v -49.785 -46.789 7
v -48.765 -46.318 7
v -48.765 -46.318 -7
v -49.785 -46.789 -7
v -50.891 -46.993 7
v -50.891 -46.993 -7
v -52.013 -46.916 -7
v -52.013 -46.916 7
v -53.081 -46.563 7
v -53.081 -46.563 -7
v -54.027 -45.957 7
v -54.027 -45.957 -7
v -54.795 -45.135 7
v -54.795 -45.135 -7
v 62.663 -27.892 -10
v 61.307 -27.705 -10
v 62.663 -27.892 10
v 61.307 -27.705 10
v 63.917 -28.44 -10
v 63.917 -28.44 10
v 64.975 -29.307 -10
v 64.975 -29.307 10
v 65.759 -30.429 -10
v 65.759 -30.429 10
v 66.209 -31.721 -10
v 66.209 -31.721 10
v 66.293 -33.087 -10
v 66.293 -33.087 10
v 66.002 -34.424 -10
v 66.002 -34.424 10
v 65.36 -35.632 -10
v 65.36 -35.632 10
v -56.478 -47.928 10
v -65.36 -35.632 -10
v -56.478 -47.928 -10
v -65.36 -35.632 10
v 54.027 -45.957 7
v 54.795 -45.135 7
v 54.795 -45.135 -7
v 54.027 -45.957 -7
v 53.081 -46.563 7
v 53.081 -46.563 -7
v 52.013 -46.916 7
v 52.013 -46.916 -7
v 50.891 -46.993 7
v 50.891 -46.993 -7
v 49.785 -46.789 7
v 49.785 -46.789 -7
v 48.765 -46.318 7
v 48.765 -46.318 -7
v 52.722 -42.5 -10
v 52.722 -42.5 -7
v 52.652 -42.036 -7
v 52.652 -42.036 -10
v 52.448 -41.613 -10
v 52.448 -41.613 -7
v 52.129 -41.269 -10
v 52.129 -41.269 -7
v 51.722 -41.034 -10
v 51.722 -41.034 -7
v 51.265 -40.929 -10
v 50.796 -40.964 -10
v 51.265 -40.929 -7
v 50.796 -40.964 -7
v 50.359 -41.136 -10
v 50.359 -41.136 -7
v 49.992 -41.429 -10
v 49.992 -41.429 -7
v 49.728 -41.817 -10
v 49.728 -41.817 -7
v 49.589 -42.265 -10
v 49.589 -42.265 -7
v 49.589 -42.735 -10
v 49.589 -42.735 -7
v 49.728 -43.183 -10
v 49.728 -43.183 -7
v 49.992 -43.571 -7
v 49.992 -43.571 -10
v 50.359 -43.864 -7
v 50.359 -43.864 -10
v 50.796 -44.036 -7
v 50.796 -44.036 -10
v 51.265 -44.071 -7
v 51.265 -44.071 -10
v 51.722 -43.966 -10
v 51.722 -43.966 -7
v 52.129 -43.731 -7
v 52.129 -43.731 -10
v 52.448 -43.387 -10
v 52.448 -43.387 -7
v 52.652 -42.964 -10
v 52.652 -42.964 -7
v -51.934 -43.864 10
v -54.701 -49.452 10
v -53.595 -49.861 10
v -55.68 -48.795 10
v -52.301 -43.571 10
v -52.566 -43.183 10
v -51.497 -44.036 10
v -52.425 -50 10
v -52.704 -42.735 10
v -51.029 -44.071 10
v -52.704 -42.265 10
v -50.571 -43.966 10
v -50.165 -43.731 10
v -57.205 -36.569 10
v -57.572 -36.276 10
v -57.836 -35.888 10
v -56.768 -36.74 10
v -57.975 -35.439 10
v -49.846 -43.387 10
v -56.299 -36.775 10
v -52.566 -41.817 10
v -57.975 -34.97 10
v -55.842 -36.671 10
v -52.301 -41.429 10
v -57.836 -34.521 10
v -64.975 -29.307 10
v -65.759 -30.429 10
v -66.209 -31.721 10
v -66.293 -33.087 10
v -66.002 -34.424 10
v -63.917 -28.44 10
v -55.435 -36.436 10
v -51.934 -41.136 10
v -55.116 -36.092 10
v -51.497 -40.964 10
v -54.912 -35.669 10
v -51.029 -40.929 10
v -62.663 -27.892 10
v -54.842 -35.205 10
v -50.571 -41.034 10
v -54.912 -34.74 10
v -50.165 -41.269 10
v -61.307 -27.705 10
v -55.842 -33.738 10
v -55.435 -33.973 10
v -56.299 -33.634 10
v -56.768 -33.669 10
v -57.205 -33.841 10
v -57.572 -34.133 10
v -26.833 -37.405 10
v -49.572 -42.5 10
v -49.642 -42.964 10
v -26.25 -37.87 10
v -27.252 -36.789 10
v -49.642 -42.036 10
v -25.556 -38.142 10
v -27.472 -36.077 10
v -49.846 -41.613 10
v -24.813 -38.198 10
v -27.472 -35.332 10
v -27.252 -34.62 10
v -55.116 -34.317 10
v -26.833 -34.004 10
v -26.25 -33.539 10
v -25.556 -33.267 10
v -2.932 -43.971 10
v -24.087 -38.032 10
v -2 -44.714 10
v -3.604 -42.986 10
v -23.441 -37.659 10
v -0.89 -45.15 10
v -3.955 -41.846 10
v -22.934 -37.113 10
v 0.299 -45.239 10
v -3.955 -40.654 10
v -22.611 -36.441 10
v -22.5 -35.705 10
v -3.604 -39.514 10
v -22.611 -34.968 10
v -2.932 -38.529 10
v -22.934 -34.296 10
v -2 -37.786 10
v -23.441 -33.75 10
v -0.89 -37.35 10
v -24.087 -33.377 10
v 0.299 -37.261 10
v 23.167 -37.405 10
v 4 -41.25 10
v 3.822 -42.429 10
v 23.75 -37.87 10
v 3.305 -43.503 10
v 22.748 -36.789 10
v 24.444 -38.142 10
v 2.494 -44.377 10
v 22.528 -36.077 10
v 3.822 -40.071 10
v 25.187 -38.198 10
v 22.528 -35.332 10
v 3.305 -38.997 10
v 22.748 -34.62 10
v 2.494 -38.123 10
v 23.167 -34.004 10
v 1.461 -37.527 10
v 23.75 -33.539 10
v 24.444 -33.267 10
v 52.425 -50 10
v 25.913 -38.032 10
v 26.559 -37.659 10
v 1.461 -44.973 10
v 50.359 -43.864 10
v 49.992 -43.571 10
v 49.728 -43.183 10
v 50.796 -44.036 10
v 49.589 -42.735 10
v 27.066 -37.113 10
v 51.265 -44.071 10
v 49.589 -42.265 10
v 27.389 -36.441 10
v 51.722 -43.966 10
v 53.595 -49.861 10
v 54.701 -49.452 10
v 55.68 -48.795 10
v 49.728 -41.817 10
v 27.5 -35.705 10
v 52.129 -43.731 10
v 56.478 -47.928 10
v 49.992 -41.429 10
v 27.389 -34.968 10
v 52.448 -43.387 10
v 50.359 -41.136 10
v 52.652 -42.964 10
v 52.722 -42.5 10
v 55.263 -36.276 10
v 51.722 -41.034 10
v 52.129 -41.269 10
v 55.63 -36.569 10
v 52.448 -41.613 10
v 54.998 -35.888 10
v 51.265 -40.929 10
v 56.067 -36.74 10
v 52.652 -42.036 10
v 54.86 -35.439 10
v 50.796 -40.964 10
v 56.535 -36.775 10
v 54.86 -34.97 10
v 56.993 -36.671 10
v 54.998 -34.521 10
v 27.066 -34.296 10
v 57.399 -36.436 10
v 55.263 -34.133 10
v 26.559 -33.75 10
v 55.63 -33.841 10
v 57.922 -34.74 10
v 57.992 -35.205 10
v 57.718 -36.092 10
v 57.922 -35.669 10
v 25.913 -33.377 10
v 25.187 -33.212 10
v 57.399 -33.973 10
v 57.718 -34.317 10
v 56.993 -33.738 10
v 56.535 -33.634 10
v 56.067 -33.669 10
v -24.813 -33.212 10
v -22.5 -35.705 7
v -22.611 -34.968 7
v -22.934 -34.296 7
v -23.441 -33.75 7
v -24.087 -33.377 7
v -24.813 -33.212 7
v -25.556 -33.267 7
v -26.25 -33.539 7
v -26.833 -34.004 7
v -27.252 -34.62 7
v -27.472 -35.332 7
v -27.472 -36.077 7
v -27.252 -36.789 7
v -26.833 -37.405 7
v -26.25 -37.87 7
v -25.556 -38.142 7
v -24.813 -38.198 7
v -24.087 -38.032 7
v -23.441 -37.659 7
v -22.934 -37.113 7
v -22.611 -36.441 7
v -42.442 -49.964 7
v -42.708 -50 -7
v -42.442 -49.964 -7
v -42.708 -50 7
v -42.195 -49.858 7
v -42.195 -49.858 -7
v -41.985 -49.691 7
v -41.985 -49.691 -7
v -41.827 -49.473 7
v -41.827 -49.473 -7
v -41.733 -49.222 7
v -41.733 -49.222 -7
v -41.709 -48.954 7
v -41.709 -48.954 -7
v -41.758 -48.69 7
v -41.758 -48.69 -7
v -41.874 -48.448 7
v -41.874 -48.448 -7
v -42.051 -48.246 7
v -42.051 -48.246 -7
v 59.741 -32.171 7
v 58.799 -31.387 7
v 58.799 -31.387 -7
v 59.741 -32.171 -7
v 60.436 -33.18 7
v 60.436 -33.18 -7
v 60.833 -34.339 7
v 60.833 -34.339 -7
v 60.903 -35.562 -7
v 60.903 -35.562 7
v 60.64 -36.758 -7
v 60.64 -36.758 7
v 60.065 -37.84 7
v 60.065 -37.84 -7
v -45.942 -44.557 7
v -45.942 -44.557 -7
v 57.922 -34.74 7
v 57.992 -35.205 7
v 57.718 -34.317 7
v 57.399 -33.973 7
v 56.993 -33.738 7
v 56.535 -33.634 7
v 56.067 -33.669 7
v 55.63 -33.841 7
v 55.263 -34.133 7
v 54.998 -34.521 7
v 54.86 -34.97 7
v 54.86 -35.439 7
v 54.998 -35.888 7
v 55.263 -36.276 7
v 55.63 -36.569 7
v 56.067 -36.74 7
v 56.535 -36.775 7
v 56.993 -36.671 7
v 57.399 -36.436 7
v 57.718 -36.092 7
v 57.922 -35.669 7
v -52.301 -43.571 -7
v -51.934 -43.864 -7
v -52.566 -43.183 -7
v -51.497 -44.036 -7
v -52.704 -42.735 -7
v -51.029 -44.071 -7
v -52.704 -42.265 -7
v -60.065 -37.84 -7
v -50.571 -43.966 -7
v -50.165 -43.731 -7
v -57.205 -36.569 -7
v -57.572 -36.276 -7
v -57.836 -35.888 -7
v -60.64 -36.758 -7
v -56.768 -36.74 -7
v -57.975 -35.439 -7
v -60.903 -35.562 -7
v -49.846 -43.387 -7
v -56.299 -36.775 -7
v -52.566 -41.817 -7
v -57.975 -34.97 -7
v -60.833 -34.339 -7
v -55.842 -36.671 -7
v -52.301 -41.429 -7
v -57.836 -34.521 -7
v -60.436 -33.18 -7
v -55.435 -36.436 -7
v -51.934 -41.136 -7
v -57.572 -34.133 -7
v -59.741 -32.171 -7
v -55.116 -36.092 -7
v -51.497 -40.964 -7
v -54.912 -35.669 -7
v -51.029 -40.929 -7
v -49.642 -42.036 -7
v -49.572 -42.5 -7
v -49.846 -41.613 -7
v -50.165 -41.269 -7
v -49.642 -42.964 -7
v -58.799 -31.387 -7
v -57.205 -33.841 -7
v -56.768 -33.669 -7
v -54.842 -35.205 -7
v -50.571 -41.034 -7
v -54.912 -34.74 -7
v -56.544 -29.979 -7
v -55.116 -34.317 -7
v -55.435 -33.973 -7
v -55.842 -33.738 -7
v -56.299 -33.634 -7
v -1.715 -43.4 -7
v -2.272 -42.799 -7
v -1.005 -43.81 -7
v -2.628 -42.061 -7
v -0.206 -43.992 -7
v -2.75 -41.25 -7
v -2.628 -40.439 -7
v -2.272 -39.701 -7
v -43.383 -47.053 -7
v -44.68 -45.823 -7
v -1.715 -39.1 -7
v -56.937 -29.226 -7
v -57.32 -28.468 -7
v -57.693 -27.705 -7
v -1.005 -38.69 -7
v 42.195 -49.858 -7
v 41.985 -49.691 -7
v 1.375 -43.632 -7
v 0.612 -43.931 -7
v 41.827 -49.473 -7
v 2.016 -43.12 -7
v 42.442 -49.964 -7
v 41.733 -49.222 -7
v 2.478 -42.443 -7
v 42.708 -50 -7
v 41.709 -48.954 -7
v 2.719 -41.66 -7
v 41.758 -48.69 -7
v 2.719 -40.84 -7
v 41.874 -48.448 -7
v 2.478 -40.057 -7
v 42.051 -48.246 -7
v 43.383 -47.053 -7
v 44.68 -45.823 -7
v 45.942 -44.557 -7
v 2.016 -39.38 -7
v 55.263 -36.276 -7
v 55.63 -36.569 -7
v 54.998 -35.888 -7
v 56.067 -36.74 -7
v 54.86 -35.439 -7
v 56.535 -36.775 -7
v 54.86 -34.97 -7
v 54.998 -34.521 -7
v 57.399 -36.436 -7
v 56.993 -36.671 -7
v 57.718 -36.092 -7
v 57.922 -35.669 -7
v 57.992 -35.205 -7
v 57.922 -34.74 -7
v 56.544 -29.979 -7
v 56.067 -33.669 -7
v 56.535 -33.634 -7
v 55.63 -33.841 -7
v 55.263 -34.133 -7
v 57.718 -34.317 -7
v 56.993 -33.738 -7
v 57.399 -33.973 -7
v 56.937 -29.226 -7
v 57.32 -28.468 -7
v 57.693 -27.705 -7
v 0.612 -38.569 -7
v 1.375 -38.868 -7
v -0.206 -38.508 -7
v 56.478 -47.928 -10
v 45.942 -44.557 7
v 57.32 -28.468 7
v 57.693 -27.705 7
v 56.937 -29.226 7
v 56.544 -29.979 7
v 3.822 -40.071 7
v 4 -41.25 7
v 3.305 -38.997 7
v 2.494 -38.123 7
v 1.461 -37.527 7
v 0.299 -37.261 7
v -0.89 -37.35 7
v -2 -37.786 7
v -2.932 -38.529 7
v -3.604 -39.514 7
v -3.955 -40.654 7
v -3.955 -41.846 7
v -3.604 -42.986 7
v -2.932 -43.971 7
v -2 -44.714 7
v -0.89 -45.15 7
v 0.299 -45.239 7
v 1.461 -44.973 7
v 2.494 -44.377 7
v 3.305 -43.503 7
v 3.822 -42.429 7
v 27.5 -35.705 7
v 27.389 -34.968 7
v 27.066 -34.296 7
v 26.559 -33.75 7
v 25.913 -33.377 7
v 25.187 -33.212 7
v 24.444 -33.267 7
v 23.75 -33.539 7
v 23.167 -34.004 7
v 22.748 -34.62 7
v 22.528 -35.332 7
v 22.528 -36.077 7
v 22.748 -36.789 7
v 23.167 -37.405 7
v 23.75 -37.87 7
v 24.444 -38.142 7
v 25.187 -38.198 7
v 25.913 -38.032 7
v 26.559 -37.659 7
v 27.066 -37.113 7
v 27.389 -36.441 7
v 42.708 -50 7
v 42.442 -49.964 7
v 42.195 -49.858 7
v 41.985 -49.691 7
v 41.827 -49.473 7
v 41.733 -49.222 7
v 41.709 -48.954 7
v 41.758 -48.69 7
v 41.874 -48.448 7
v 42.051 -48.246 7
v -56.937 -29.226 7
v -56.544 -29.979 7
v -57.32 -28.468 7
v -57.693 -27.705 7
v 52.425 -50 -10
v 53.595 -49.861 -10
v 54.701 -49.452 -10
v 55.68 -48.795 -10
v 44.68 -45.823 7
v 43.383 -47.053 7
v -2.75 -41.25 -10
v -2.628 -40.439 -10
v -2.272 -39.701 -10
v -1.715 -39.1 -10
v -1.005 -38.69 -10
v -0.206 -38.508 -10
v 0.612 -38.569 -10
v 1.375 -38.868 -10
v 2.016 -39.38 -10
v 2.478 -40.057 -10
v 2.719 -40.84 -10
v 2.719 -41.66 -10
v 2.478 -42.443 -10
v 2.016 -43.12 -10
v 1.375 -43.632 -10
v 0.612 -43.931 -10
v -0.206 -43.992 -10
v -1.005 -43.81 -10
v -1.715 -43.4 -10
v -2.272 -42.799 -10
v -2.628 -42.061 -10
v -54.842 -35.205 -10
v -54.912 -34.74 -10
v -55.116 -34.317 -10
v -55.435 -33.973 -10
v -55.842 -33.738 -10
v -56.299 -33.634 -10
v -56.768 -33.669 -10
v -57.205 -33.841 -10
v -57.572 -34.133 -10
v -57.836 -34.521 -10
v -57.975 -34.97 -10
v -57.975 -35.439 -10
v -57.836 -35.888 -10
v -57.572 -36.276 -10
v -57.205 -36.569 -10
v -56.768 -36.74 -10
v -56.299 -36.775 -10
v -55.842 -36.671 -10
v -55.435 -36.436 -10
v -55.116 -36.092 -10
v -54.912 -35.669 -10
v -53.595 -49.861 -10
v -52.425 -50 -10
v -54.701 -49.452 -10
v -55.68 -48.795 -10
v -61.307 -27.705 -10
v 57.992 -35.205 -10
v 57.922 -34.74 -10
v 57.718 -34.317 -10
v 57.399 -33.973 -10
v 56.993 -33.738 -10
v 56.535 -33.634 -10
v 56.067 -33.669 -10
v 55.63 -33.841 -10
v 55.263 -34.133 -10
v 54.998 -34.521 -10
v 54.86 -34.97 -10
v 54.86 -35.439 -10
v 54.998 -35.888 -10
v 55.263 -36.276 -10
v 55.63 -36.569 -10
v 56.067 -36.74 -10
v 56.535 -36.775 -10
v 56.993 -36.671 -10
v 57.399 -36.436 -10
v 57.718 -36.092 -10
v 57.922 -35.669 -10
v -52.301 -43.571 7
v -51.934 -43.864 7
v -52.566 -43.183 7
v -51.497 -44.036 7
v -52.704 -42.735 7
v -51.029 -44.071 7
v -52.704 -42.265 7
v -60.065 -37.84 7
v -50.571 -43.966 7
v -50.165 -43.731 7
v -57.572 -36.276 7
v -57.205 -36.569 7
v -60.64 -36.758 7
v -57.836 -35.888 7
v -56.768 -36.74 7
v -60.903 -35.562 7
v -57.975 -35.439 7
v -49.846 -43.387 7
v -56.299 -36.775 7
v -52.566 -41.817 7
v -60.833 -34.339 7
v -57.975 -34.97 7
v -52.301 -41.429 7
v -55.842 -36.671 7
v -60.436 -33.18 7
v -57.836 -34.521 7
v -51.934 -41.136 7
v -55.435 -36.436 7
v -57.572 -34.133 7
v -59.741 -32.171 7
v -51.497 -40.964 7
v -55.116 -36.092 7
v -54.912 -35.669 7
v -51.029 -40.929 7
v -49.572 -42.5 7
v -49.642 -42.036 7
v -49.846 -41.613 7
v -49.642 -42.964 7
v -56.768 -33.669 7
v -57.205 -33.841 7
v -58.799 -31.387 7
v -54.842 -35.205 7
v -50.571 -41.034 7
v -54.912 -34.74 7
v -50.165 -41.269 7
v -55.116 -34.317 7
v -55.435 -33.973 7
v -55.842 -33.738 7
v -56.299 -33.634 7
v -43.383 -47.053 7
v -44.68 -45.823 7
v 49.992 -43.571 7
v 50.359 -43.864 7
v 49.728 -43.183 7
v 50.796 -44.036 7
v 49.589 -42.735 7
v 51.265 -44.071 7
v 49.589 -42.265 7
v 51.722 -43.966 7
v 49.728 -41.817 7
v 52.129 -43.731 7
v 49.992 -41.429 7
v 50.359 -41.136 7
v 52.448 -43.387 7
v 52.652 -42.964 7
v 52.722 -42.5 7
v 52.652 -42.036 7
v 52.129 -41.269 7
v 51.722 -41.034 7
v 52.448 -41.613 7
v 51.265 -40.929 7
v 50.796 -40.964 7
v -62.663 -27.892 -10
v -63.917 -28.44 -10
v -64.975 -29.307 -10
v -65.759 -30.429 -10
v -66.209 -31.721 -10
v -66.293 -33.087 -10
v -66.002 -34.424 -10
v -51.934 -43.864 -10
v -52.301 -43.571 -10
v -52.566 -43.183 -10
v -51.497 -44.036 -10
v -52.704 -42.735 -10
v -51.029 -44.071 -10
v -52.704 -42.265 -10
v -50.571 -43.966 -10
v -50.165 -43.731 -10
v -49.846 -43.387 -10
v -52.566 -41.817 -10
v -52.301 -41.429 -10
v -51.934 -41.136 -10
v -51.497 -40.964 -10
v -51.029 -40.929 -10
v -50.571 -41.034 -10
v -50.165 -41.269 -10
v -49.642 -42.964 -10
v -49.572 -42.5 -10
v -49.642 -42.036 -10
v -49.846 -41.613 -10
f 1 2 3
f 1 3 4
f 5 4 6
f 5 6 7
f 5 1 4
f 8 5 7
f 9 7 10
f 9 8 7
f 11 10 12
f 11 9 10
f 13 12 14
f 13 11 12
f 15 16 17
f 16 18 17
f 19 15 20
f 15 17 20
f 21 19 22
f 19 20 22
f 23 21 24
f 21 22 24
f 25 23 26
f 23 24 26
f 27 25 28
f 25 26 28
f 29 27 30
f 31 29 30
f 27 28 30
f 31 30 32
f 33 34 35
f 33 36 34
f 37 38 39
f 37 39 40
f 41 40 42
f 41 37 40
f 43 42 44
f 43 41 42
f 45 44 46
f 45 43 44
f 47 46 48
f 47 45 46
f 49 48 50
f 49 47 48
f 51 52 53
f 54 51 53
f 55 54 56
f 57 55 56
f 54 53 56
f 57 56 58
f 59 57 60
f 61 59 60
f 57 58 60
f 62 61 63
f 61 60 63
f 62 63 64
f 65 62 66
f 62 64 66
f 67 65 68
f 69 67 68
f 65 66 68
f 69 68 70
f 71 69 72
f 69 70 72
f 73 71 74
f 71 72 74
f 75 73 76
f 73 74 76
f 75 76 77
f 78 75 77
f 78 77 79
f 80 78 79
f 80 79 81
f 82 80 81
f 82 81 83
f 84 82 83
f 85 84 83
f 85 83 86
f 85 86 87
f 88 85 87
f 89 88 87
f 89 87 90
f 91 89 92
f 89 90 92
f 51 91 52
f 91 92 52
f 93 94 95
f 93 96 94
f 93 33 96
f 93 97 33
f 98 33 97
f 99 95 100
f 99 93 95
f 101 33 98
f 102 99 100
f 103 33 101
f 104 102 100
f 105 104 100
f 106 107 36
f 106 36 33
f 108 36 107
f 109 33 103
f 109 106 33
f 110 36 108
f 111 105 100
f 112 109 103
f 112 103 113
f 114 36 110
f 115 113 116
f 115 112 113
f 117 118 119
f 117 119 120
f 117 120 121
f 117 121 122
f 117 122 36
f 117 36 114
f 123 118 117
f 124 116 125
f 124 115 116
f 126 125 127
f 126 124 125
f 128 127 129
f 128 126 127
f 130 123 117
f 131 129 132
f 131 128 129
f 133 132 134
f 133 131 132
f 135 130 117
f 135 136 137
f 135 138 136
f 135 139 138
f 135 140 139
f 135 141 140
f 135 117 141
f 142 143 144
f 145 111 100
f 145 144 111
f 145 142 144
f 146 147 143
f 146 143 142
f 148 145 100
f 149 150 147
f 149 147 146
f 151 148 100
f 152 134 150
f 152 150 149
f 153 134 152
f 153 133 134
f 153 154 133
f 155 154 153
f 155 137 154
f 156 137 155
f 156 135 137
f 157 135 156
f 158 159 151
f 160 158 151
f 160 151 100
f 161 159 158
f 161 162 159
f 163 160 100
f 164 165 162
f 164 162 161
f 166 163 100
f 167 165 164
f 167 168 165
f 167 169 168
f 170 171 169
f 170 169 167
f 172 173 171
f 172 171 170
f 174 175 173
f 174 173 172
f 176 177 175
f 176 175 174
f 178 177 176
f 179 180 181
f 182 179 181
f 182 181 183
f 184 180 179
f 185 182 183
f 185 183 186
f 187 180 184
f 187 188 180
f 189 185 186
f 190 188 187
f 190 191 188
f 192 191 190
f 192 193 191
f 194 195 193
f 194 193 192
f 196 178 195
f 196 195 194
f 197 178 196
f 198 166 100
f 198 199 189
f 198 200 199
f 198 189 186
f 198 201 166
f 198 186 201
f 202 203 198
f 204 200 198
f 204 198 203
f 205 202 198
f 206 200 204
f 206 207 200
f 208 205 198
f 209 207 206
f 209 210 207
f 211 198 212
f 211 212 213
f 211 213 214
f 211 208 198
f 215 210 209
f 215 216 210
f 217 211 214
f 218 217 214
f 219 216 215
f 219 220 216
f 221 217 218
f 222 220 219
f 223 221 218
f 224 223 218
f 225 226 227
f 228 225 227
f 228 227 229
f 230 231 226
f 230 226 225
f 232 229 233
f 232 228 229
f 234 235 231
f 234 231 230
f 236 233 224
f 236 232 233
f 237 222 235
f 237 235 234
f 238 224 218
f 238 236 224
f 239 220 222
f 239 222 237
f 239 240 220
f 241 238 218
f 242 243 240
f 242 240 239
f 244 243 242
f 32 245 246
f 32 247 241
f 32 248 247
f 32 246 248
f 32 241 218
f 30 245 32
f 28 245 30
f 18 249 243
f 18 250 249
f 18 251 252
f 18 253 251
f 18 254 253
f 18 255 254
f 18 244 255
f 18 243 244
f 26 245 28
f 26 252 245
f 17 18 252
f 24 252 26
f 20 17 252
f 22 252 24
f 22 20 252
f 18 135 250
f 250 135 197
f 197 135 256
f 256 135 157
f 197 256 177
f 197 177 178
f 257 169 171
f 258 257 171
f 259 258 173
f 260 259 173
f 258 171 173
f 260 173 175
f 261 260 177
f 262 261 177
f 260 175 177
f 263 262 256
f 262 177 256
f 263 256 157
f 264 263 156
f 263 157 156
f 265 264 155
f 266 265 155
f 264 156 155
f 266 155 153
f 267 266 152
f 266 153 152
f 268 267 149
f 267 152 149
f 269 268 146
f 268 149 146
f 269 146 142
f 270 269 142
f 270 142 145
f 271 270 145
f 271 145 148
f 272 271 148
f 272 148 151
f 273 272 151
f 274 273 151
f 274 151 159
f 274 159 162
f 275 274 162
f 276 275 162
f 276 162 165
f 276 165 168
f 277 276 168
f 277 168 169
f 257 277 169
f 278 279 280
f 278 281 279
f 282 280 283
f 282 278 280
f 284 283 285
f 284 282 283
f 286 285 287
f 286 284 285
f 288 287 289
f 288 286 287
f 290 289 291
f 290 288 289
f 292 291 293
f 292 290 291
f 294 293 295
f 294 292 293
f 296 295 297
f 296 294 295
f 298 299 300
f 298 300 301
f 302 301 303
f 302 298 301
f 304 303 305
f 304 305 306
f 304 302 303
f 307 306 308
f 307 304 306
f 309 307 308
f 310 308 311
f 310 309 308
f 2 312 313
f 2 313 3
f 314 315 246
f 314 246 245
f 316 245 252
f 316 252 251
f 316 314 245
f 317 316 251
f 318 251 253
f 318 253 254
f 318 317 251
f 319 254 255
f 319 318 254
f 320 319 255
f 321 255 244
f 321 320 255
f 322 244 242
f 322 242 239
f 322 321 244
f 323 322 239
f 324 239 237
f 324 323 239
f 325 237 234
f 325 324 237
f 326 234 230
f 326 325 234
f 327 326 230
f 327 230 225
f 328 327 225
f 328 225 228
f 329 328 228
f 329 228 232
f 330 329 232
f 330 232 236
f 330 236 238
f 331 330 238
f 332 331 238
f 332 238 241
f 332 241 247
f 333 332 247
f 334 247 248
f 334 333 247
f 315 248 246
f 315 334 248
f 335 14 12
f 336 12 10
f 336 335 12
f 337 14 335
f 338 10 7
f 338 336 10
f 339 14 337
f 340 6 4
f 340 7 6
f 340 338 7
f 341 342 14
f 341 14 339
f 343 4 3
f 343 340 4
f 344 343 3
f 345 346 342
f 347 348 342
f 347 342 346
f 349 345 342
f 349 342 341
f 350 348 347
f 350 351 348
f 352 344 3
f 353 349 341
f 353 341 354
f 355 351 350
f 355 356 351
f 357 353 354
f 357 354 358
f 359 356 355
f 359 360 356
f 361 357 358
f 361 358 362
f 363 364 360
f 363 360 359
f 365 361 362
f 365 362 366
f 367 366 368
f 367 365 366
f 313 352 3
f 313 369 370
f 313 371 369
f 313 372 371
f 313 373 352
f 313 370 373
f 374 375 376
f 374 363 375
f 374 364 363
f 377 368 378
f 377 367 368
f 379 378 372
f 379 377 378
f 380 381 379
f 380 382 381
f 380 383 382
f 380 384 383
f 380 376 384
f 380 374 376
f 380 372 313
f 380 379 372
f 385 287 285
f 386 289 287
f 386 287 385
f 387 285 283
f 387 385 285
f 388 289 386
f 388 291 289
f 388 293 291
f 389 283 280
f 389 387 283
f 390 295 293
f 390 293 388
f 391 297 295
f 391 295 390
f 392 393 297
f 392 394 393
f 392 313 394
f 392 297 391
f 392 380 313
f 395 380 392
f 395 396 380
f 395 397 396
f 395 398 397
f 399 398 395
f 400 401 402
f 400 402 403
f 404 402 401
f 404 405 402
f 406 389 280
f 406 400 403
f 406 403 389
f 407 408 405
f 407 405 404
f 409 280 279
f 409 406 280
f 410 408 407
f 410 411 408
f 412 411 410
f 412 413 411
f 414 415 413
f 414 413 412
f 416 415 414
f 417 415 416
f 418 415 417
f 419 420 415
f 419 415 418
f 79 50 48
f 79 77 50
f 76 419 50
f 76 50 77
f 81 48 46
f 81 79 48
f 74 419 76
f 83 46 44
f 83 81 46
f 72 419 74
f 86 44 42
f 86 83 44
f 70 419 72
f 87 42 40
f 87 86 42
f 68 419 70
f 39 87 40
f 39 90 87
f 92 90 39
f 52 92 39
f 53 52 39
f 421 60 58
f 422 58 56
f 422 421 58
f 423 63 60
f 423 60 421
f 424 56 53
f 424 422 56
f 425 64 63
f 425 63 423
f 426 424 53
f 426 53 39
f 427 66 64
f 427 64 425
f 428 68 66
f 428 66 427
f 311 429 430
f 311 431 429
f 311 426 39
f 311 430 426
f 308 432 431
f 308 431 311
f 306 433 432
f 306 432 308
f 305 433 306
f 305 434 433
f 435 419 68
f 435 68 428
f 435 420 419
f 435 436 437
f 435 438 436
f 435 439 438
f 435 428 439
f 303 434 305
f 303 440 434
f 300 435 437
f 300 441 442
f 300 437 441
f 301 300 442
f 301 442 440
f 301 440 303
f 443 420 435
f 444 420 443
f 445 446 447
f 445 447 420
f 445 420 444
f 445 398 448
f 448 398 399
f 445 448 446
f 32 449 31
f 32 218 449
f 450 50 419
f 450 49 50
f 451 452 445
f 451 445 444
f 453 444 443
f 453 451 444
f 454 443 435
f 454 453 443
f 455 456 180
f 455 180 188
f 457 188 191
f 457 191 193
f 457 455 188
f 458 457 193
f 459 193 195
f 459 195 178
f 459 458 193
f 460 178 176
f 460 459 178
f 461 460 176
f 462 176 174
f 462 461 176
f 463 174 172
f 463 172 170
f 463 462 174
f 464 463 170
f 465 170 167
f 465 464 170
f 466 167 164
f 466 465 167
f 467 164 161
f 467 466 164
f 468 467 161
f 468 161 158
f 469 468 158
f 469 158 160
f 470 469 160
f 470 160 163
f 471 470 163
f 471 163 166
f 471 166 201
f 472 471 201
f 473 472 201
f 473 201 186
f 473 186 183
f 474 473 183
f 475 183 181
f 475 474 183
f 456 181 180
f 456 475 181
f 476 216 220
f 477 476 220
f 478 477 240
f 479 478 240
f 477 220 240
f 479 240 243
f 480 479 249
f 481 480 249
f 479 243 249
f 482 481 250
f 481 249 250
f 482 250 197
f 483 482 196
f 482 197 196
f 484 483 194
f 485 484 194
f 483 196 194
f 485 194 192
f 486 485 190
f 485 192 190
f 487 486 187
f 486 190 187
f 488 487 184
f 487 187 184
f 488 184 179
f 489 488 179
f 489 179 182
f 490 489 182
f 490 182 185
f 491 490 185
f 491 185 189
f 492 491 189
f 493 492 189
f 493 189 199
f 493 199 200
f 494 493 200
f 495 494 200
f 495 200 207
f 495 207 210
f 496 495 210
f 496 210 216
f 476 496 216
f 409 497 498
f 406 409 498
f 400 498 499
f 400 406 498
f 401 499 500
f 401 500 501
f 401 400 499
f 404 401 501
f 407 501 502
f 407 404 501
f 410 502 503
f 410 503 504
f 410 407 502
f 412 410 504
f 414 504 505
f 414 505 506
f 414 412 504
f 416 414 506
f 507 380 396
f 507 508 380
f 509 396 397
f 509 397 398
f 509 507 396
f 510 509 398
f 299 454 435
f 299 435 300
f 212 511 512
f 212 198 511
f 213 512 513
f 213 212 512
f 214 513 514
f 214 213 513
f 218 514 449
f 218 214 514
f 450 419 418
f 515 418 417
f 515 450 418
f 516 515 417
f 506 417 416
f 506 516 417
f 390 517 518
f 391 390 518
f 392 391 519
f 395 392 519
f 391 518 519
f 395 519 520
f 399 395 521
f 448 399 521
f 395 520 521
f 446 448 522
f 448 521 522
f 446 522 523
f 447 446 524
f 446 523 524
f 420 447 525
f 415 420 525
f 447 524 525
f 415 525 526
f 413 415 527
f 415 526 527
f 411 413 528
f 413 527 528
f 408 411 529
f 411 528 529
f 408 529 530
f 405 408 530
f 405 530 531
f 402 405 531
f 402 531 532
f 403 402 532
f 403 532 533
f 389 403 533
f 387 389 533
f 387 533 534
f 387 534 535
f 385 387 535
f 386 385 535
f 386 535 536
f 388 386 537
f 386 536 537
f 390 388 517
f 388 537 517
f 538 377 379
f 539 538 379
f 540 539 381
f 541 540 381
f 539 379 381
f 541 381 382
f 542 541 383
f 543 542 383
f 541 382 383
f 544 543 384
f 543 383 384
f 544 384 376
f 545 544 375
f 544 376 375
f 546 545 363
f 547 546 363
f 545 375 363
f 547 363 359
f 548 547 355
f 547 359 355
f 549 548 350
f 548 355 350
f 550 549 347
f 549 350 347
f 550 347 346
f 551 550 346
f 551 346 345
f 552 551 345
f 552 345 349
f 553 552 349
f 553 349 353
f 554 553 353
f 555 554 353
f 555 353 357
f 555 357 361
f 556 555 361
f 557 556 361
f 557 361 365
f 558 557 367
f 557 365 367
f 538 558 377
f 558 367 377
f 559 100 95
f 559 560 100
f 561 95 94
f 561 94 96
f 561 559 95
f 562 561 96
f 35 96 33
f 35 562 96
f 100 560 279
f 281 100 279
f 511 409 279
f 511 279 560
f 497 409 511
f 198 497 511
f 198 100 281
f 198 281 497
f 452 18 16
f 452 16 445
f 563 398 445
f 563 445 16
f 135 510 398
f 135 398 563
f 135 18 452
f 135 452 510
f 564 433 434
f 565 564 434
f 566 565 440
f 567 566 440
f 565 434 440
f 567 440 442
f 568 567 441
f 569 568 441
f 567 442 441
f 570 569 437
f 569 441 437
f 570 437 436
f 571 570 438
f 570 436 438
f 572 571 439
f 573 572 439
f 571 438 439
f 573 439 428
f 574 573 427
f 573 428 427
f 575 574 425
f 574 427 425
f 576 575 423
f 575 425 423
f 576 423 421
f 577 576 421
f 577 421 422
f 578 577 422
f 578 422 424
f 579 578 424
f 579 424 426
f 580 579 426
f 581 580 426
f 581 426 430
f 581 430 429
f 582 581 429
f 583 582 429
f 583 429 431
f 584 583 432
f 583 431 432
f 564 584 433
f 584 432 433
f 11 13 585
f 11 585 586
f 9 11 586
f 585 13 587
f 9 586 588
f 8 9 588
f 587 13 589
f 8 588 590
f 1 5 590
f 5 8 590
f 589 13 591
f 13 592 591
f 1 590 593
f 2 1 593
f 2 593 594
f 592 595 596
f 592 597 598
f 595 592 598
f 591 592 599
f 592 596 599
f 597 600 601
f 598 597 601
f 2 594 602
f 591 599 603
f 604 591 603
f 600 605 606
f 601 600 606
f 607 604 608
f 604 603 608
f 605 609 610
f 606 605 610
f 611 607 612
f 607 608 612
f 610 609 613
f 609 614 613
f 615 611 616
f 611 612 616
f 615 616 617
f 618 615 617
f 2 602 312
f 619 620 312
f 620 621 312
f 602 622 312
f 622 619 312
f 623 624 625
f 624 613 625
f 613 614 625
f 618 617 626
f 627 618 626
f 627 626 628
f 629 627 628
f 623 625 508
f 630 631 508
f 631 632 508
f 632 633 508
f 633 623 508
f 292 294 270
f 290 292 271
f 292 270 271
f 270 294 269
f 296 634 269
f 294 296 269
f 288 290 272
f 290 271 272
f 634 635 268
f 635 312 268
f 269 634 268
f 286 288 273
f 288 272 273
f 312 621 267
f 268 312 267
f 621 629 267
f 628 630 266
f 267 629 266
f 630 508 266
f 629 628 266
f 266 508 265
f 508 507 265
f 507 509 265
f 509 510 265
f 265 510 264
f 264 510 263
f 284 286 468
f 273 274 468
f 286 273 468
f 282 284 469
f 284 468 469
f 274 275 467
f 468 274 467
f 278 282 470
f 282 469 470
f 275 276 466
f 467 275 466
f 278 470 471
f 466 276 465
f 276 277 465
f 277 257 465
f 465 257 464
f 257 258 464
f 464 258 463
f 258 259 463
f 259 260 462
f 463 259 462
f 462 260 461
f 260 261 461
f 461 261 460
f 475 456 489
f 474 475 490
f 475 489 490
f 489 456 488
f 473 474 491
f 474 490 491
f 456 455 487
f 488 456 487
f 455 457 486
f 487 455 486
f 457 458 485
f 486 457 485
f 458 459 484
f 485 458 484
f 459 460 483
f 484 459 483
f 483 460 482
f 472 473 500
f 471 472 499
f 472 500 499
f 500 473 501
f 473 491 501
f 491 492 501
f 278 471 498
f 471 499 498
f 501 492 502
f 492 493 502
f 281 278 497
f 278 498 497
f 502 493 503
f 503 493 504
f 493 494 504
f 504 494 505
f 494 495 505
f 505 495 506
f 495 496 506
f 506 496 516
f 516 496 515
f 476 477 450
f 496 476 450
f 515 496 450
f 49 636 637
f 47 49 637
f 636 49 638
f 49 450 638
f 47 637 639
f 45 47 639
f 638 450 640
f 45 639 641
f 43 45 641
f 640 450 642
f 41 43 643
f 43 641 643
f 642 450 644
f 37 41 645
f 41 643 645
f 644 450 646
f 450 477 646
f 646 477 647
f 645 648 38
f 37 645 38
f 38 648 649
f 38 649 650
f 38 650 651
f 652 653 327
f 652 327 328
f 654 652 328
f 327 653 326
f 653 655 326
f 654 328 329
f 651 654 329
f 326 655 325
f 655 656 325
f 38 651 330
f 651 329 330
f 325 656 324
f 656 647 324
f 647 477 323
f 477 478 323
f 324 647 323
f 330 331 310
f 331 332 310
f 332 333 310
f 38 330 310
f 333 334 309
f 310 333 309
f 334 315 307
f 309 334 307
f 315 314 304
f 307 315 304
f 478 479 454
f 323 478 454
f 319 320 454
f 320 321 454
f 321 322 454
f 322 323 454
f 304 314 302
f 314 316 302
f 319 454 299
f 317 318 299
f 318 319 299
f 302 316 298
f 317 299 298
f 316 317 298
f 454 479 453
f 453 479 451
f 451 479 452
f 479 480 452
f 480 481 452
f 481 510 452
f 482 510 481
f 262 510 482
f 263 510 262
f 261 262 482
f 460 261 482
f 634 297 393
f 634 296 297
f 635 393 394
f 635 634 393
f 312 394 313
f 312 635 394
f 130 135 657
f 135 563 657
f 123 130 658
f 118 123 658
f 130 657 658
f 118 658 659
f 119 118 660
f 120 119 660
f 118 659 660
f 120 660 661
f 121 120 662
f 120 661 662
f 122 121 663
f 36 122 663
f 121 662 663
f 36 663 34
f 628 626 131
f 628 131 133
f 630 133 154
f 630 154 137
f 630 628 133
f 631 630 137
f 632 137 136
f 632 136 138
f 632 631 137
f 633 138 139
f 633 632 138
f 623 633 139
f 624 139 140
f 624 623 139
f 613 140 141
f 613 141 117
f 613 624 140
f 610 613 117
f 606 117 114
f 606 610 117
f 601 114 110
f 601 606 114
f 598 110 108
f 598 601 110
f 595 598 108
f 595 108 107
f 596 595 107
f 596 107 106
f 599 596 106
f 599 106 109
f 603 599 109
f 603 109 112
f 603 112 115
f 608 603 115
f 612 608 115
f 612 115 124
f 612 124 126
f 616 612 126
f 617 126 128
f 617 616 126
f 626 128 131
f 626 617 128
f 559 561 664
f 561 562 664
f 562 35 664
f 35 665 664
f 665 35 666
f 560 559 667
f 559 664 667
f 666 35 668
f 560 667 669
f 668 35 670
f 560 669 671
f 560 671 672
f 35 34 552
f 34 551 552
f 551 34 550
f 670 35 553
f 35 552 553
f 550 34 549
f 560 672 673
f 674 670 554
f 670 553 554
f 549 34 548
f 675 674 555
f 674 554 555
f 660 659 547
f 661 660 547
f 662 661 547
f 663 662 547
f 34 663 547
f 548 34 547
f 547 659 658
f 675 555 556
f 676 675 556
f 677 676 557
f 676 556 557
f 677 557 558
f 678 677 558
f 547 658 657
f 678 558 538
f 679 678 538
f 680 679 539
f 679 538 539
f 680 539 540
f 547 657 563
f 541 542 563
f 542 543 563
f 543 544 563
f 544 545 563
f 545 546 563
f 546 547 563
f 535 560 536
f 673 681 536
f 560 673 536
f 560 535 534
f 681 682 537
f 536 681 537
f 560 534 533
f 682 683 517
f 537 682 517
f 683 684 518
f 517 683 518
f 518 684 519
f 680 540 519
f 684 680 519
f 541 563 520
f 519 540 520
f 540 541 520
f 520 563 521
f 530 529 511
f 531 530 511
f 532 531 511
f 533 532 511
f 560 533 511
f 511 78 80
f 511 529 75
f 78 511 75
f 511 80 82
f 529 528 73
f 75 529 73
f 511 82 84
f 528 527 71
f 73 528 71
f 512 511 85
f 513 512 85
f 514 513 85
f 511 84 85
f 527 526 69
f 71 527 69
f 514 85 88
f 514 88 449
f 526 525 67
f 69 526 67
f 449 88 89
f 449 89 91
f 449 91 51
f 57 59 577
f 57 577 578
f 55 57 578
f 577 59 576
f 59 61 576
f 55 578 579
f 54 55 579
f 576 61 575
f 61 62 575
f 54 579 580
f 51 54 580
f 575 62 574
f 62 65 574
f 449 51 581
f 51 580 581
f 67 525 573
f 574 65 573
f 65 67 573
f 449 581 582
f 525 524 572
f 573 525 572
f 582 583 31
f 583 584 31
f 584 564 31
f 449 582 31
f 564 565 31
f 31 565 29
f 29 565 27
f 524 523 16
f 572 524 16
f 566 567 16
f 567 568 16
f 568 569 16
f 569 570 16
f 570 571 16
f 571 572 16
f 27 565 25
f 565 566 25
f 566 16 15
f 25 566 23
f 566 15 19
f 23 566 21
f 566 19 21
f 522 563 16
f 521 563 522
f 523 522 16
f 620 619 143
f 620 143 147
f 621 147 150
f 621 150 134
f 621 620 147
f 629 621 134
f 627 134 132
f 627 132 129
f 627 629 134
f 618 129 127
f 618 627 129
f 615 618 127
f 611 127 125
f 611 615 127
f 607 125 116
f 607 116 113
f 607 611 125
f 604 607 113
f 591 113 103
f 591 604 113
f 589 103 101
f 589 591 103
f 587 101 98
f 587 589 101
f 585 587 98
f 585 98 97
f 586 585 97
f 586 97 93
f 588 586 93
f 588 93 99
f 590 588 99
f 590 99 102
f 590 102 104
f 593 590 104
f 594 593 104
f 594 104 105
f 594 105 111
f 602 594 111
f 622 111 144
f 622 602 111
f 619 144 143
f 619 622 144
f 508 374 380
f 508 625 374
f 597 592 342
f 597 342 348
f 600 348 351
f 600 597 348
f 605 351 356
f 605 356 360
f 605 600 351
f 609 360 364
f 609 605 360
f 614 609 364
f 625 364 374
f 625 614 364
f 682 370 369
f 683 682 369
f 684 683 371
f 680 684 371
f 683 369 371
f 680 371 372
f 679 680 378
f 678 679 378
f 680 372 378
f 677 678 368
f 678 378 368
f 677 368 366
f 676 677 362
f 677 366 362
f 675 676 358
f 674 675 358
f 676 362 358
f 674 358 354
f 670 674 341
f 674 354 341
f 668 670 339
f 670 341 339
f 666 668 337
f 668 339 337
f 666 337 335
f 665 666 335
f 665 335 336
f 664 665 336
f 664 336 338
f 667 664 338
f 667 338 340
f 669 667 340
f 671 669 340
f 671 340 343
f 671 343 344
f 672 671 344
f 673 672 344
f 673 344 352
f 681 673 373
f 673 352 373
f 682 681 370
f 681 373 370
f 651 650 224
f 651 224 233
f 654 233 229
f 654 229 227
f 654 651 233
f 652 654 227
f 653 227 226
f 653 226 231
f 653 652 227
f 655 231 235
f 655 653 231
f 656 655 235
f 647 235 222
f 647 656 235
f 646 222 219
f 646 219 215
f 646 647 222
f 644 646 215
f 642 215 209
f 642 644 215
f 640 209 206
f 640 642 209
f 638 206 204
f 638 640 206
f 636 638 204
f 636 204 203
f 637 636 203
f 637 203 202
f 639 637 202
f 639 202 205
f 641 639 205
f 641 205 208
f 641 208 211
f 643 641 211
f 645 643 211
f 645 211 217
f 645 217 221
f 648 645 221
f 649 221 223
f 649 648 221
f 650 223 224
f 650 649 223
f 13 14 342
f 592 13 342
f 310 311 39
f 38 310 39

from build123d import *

# Parameters (mm, degrees)
BOSS_EXTRUDE1_DEPTH   = 7
BOSS_EXTRUDE1_2_DEPTH = 7
SKETCH2_R             = 4
SKETCH2_R_2           = 1.575
BOSS_EXTRUDE2_DEPTH   = 3
FILLET1_R             = 5
FILLET2_R             = 1
SKETCH3_R             = 6.014810067
SKETCH3_R_2           = 2.75
BOSS_EXTRUDE3_DEPTH   = 3
SKETCH4_R             = 2.5
CUT_EXTRUDE1_DEPTH    = 10


with BuildPart() as part:
    # Sketch1 → Boss-Extrude1 (new, symmetric)
    with BuildSketch(Plane.XY):
        with BuildLine():
            Line((-57.692807239, -27.704512139), (-71.0874428, -27.704512139))
            Line((-71.0874428, -27.704512139), (-54.981120944, -50))
            Line((-54.981120944, -50), (-39.949968711, -50))
            ThreePointArc((-39.949968711, -50), (-43.032344249, -47.373171188), (-45.942408988, -44.556649968))
            Line((-45.942408988, -44.556649968), (-48.76458719, -46.317700387))
            ThreePointArc((-48.76458719, -46.317700387), (-52.012858014, -46.915883336), (-54.794591341, -45.135140265))
            Line((-54.794591341, -45.135140265), (-60.064871871, -37.839652404))
            ThreePointArc((-60.064871871, -37.839652404), (-60.833011276, -34.338501535), (-58.79938816, -31.386811752))
            Line((-58.79938816, -31.386811752), (-56.544061175, -29.979478746))
            ThreePointArc((-56.544061175, -29.979478746), (-57.129759272, -28.847714043), (-57.692807239, -27.704512139))
        make_face()
    extrude(amount=BOSS_EXTRUDE1_DEPTH, both=True)



with BuildPart() as body_2:
    # Sketch1 → Boss-Extrude1 2 (new, symmetric)
    with BuildSketch(Plane.XY):
        with BuildLine():
            Line((39.949968711, -50), (54.981120944, -50))
            Line((54.981120944, -50), (71.0874428, -27.704512139))
            Line((71.0874428, -27.704512139), (57.692807239, -27.704512139))
            ThreePointArc((57.692807239, -27.704512139), (57.129759272, -28.847714043), (56.544061175, -29.979478746))
            Line((56.544061175, -29.979478746), (58.79938816, -31.386811752))
            ThreePointArc((58.79938816, -31.386811752), (60.833011276, -34.338501535), (60.064871871, -37.839652404))
            Line((60.064871871, -37.839652404), (54.794591341, -45.135140265))
            ThreePointArc((54.794591341, -45.135140265), (52.012858014, -46.915883336), (48.76458719, -46.317700387))
            Line((48.76458719, -46.317700387), (45.942408988, -44.556649968))
            ThreePointArc((45.942408988, -44.556649968), (43.032344249, -47.373171188), (39.949968711, -50))
        make_face()
    extrude(amount=BOSS_EXTRUDE1_2_DEPTH, both=True)


with BuildPart() as part_1:
    add(part.part)

    add(body_2.part)  # Boss-Extrude2 merges body 2
    # Sketch2 → Boss-Extrude2 (add)
    with BuildSketch(Plane.XY.offset(7)):
        Polygon((-54.981120944, -50), (54.981120944, -50), (71.0874428, -27.704512139), (-71.0874428, -27.704512139), align=None)
        with Locations((0, -41.25)):
            Circle(SKETCH2_R, mode=Mode.SUBTRACT)
        with Locations((-51.14684741, -42.5)):
            Circle(SKETCH2_R_2, mode=Mode.SUBTRACT)
        with Locations((-56.417127941, -35.204512139)):
            Circle(SKETCH2_R_2, mode=Mode.SUBTRACT)
        with Locations((56.417127941, -35.204512139)):
            Circle(SKETCH2_R_2, mode=Mode.SUBTRACT)
        with Locations((51.14684741, -42.5)):
            Circle(SKETCH2_R_2, mode=Mode.SUBTRACT)
    boss_extrude2 = extrude(amount=BOSS_EXTRUDE2_DEPTH)

    # Mirror2: Boss-Extrude2 across plane
    add(boss_extrude2.mirror(Plane.XY))

    # Fillet1
    fillet1_edges = [part_1.edges().sort_by_distance(p)[0] for p in [
        (-54.981120944, -50, 0),
        (-71.0874428, -27.704512139, 0),
        (54.981120944, -50, 0),
        (71.0874428, -27.704512139, 0),
    ]]
    fillet(fillet1_edges, radius=FILLET1_R)

    # Fillet2
    fillet2_edges = [part_1.edges().sort_by_distance(p)[0] for p in [
        (-39.949968711, -50, 0),
        (39.949968711, -50, 0),
    ]]
    fillet(fillet2_edges, radius=FILLET2_R)

    # Sketch3 → Boss-Extrude3 (add)
    with BuildSketch(Plane(origin=(0, 0, -10), x_dir=(-1, 0, 0), z_dir=(0, 0, -1))):
        with Locations((0, -41.25)):
            Circle(SKETCH3_R)
        with Locations((0, -41.25)):
            Circle(SKETCH3_R_2, mode=Mode.SUBTRACT)
    extrude(amount=-BOSS_EXTRUDE3_DEPTH)

    # Sketch4 → Cut-Extrude1 (cut)
    with BuildSketch(Plane.XY.offset(10)):
        with Locations((-25, -35.704512139)):
            Circle(SKETCH4_R)
        with Locations((25, -35.704512139)):
            Circle(SKETCH4_R)
    extrude(amount=-CUT_EXTRUDE1_DEPTH, mode=Mode.SUBTRACT)


solid = part_1.part
